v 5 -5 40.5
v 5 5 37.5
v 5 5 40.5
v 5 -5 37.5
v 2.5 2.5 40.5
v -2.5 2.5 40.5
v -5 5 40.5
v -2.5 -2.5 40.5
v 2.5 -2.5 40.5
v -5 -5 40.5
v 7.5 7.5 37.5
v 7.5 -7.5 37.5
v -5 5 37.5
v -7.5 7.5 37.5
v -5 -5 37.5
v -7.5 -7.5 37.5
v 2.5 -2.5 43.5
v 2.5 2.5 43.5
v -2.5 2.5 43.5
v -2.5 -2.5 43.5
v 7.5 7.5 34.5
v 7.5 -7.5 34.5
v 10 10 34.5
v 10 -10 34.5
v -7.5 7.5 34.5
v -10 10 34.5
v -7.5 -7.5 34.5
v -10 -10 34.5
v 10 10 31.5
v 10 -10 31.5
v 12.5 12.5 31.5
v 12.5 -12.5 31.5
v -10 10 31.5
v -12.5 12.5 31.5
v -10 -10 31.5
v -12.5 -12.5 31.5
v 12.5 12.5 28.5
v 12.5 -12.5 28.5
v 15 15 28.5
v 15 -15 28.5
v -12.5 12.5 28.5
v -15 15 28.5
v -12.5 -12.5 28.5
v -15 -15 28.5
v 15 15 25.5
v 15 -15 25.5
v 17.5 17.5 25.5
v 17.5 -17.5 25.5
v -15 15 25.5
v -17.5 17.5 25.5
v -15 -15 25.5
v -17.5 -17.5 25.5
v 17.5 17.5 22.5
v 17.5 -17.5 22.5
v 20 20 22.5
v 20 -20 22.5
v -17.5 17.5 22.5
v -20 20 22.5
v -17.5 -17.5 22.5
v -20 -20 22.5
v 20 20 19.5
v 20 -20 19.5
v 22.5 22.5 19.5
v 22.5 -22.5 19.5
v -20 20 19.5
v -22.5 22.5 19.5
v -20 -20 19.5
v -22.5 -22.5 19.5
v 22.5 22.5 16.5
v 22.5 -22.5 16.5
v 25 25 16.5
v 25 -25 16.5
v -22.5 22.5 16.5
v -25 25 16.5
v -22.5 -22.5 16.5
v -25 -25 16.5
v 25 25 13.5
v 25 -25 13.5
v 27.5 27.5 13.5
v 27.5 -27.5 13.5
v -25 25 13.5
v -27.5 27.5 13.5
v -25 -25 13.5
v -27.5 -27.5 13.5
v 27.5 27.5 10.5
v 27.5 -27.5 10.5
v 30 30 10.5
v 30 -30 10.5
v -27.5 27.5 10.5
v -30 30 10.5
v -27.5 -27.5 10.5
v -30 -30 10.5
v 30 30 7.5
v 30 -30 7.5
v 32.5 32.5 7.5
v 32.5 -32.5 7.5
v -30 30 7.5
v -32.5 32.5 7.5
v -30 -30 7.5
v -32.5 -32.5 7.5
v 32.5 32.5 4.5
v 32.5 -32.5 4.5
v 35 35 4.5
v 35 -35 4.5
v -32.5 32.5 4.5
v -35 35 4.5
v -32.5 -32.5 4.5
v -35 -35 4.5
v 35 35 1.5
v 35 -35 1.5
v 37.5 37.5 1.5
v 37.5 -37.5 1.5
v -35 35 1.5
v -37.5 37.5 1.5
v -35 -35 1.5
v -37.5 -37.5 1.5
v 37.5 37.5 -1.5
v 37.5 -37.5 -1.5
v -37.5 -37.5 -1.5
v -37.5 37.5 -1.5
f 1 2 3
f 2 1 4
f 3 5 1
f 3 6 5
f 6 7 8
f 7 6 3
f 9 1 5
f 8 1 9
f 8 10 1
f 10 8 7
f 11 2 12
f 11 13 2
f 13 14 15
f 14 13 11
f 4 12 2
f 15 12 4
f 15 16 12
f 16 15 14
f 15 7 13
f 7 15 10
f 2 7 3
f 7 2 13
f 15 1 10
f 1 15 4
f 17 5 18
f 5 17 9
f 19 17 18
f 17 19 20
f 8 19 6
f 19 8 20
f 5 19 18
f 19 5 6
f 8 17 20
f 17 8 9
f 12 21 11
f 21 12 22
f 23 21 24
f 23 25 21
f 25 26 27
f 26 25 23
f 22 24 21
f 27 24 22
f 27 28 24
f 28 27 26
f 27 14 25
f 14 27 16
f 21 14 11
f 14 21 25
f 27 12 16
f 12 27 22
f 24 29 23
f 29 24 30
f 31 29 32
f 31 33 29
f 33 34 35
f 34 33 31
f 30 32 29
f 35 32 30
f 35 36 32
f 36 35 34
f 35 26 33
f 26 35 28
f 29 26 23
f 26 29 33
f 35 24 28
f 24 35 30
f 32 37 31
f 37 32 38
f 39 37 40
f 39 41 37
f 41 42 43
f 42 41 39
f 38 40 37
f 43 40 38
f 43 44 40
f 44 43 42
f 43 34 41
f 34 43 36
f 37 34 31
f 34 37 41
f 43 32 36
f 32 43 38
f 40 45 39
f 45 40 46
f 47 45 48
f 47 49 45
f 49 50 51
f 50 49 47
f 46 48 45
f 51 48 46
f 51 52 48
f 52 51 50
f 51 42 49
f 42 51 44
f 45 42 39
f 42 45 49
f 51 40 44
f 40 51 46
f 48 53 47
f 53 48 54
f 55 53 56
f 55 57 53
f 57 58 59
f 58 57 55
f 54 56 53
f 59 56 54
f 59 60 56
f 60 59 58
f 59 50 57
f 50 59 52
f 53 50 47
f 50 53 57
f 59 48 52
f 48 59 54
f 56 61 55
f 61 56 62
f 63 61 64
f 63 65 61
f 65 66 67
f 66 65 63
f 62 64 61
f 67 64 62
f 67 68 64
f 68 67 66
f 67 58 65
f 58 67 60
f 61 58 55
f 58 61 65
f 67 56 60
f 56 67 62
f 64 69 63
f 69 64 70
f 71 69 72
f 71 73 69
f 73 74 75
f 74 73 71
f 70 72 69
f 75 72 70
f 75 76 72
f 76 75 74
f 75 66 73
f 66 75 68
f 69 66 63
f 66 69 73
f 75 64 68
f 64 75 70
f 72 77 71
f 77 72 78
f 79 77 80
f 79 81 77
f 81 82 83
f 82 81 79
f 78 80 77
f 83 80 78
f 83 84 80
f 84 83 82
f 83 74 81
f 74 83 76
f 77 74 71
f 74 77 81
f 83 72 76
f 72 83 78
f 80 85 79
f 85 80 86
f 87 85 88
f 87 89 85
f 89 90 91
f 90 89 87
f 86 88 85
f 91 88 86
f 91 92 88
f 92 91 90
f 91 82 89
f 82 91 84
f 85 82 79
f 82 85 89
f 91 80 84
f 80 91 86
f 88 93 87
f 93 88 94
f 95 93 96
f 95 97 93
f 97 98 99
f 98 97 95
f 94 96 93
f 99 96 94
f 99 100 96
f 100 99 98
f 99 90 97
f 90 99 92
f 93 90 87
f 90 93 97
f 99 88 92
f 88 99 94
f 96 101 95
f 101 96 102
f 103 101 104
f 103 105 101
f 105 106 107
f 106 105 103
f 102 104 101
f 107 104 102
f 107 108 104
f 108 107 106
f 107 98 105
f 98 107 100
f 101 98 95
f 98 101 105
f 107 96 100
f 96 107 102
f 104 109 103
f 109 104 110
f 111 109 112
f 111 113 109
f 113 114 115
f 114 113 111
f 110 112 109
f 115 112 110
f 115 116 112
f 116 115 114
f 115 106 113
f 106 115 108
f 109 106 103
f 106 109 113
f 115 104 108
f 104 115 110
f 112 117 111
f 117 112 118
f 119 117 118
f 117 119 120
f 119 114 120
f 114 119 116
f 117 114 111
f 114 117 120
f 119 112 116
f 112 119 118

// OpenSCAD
step=3;
min=5;

module zigurat(n)
{
    if(n<=1){
        cube([min,min,step],center=true);
    }else{
                cube([n*min,n*min,step],center=true);
        translate([0,0,step])
            zigurat(n-1);
    }
        
}

zigurat(15);
